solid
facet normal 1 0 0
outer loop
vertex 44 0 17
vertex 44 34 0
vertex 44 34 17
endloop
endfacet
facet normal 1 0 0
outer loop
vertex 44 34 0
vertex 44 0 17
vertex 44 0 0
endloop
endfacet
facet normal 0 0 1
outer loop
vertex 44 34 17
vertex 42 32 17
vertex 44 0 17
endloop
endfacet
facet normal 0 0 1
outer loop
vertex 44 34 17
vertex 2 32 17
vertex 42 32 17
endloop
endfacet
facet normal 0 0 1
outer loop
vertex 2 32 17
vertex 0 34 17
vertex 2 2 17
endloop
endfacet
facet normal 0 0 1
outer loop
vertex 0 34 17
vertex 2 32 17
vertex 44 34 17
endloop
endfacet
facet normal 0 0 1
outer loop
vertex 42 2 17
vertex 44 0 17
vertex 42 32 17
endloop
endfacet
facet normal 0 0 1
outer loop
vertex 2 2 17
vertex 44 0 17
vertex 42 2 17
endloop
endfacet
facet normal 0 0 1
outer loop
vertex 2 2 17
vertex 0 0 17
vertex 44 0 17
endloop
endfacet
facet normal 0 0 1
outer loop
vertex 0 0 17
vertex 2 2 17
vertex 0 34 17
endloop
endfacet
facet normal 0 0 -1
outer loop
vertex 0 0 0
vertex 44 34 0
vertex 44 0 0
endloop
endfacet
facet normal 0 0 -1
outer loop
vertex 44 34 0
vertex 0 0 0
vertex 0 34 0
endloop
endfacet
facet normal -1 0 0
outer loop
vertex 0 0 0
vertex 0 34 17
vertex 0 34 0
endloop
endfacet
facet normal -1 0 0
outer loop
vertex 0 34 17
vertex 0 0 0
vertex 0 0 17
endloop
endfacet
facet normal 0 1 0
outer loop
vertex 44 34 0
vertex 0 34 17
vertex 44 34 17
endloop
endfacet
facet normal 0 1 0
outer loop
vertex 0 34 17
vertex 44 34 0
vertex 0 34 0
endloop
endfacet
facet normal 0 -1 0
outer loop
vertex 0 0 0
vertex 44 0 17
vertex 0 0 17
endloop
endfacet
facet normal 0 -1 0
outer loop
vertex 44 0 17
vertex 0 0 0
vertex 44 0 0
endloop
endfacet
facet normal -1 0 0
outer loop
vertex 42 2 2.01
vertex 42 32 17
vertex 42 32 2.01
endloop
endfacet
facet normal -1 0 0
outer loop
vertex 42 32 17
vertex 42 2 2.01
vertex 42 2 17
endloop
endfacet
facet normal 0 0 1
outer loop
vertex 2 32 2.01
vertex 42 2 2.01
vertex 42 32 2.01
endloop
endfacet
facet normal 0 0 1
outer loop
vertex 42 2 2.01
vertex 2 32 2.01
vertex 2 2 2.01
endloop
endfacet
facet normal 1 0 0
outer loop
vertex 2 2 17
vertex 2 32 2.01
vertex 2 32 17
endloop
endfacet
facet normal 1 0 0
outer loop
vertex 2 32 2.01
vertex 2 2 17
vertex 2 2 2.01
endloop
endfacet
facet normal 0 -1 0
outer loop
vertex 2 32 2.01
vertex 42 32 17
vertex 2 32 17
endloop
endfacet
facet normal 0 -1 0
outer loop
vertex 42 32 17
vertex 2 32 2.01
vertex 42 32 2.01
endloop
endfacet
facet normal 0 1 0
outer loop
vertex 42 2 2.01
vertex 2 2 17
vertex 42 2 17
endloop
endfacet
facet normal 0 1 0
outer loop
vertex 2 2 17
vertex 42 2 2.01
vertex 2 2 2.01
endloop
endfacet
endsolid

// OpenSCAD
text_intrusion = 1;

/* [box dimensions] */
//inner box length
iB_width = 40;
//inner box depth
iB_depth  = 30;
//inner box height
iB_height = 15;
//wall thickness
wall_thickness = 2;

/* [lid dimensions] */
//the height of the lid
lid_height = 3;

/* [Left] */
//add a barrel jack to the left side (-x)
barrel_jack_left = false;
//add a cable hole to the left side (-x)
square_left = false;
//the size of the square
square_left_size = [10, 10];
//air holes
holes_left         = false;
holes_left_d       = 2;
holes_left_rows    = 5;
holes_left_columns = 5;
//the text which should be written on the left side
text_left = "";
//should the text be extruded in intruded
text_left_in_or_out = "in"; //[ex:extrude, in:intrude]
text_left_size = 10;
text_left_font = "";
text_left_spacing = 1; //[0:0.1:100]

/* [Right] */
//add a barrel jack to the right side (+x)
barrel_jack_right = false;
//add a cable hole to the right side (+x)
square_right = false;
//the size of the square
square_right_size = [10, 10];
//air holes
holes_right         = false;
holes_right_d       = 2;
holes_right_rows    = 5;
holes_right_columns = 5;
//the text which should be written on the right side
text_right = "";
text_right_size = 10;
text_right_font = "";
text_right_spacing = 1; //[0:0.1:100]

/* [Top] */
//add a barrel jack to the top side (-z)
barrel_jack_top = false;
//add a cable hole to the top side (-z)
square_top = false;
//the size of the square
square_top_size = [10, 10];
//air holes
holes_top         = false;
holes_top_d       = 2;
holes_top_rows    = 5;
holes_top_columns = 5;
//the text which should be written on the top side
text_top = "";
text_top_size = 10;
text_top_font = "";
text_top_spacing = 1; //[0:0.1:100]

/* [Bottom] */
//add a barrel jack to the bottom side (+z)
barrel_jack_bottom = false;
//add a cable hole to the bottom side (+z)
square_bottom = false;
//the size of the square
square_bottom_size = [10, 10];
//air holes
holes_bottom         = false;
holes_bottom_d       = 2;
holes_bottom_rows    = 5;
holes_bottom_columns = 5;
//the text which should be written on the bottom side
text_bottom = "";
text_bottom_size = 10;
text_bottom_font = "";
text_bottom_spacing = 1; //[0:0.1:100]

/* [Front] */
//add a barrel jack to the front side (+y)
barrel_jack_front = false;
//add a cable hole to the front side (+y)
square_front = false;
//the size of the square
square_front_size = [10, 10];
//air holes
holes_front         = false;
holes_front_d       = 2;
holes_front_rows    = 5;
holes_front_columns = 5;
//the text which should be written on the front side
text_front = "";
text_front_size = 10;
text_front_font = "";
text_front_spacing = 1; //[0:0.1:100]

/* [Back] */
//add a barrel jack to the back side (-y)
barrel_jack_back = false;
//add a cable hole to the back side (-y)
square_back = false;
//the size of the square
square_back_size = [10, 10];
//air holes
holes_back         = false;
holes_back_d       = 2;
holes_back_rows    = 5;
holes_back_columns = 5;
//the text which should be written on the back side
text_back = "";
text_back_size = 10;
text_back_font = "";
text_back_spacing = 1; //[0:0.1:100]



/* [Render Options] */
//show the lid
show_lid = false;
//show the box
show_box = true;
//resolution
$fn = 100;

/* [Hidden] */
//DIMENSIONS
//barrel_jack
barrel_jack_d = 8;

//margin for the overlaps so that the preview gets right
preview_margin = 0.01;


module box(){
    difference(){
        //outher shell
        cube([iB_width + 2*wall_thickness, iB_depth + 2*wall_thickness, iB_height + wall_thickness]);
        //remove inside
        translate([wall_thickness, wall_thickness, wall_thickness + preview_margin]){
            cube([iB_width, iB_depth, iB_height]);
        }

        //connections
        //add barrel jack-hole(s)
        if(barrel_jack_left){
            translate([wall_thickness/2, wall_thickness + iB_depth/2, wall_thickness + iB_height/2]){
                rotate([0, 90, 0]){
                    cylinder(d=barrel_jack_d, h=wall_thickness+4*preview_margin, center=true);
                }
            }
        }
        if(barrel_jack_right){
            translate([wall_thickness*3/2 + iB_width, wall_thickness + iB_depth/2, wall_thickness + iB_height/2]){
                rotate([0, 90, 0]){
                    cylinder(d=barrel_jack_d, h=wall_thickness+4*preview_margin, center=true);
                }
            }
        }
        if(barrel_jack_bottom){
            translate([wall_thickness + iB_width/2, wall_thickness + iB_depth/2, wall_thickness/2]){
                rotate([0, 0, 0]){
                    cylinder(d=barrel_jack_d, h=wall_thickness+4*preview_margin, center=true);
                }
            }
        }
        if(barrel_jack_back){
            translate([wall_thickness + iB_width/2, wall_thickness/2, wall_thickness + iB_height/2]){
                rotate([90, 0, 0]){
                    cylinder(d=barrel_jack_d, h=wall_thickness+4*preview_margin, center=true);
                }
            }
        }
        if(barrel_jack_front){
            translate([wall_thickness + iB_width/2, wall_thickness*3/2 + iB_depth, wall_thickness + iB_height/2]){
                rotate([90, 0, 0]){
                    cylinder(d=barrel_jack_d, h=wall_thickness+4*preview_margin, center=true);
                }
            }
        }
        //add cable holes 
        if(square_left){
            translate([wall_thickness/2, wall_thickness + iB_depth/2, wall_thickness + iB_height/2]){
                cube(concat(wall_thickness+4*preview_margin, square_left_size), center=true);
            }
        }
        if(square_right){
            translate([wall_thickness*3/2 + iB_width, wall_thickness + iB_depth/2, wall_thickness + iB_height/2]){
                cube(concat(wall_thickness+4*preview_margin, square_right_size), center=true);
            }
        }
        if(square_bottom){
            translate([wall_thickness + iB_width/2, wall_thickness + iB_depth/2, wall_thickness/2]){
                cube(concat(square_bottom_size, wall_thickness+4*preview_margin), center=true);
            }
        }
        if(square_back){
            translate([wall_thickness + iB_width/2, wall_thickness/2, wall_thickness + iB_height/2]){
                cube([square_back_size[0], wall_thickness+4*preview_margin, square_back_size[1]], center=true);
            }
        }
        if(square_front){
            translate([wall_thickness + iB_width/2, wall_thickness*3/2 + iB_depth, wall_thickness + iB_height/2]){
                cube([square_front_size[0], wall_thickness+4*preview_margin, square_front_size[1]], center=true);
            }
        }

        //add air holes
        if(holes_left){
            translate([holes_left_d, wall_thickness, wall_thickness]) {
                rotate([0, -90, 0]){
                    #circles(d=holes_left_d, h=wall_thickness,
                            row=holes_left_rows, column=holes_left_columns,
                            height=iB_depth, width=iB_height);
                }
            }
        }
        if(holes_right){
            translate([2*wall_thickness+iB_width, wall_thickness, wall_thickness]) {
                rotate([0, -90, 0]){
                    #circles(d=holes_left_d, h=wall_thickness,
                            row=holes_left_rows, column=holes_left_columns,
                            height=iB_depth, width=iB_height);
                }
            }
        }
        if(holes_bottom){
            translate([wall_thickness, wall_thickness, 0]) {
                rotate([0, 0, 0]){
                    #circles(d=holes_left_d, h=wall_thickness,
                            row=holes_left_rows, column=holes_left_columns,
                            height=iB_depth, width=iB_width);
                }
            }
        }
        if(holes_back){
            translate([wall_thickness, 0, wall_thickness]) {
                rotate([0, -90, -90]){
                    #circles(d=holes_left_d, h=wall_thickness,
                            row=holes_left_rows, column=holes_left_columns,
                            height=iB_width, width=iB_height);
                }
            }
        }
        if(holes_front){
            translate([wall_thickness, wall_thickness+iB_depth, wall_thickness]) {
                rotate([0, -90, -90]){
                    #circles(d=holes_left_d, h=wall_thickness,
                            row=holes_left_rows, column=holes_left_columns,
                            height=iB_width, width=iB_height);
                }
            }
        }

        //TEXT (intrusion)
        //left
        if(text_left != ""){
            translate([text_intrusion-preview_margin, wall_thickness+iB_depth/2, wall_thickness+iB_height/2]){
                rotate([90, 0, -90]){
                    linear_extrude(text_intrusion){
                        text(text=text_left, size=text_left_size, font=text_left_font, spacing=text_left_spacing,
                            halign="center", valign="center");
                    }
                }
            }
        }
        //right
        if(text_right != ""){
            translate([wall_thickness*2 + iB_width - text_intrusion, wall_thickness + iB_depth/2, wall_thickness + iB_height/2]){
                rotate([90, 0, 90]){
                    linear_extrude(text_intrusion){
                        text(text=text_right, size=text_right_size, font=text_right_font, spacing=text_right_spacing,
                            halign="center", valign="center");
                    }
                }
            }
        }
        //bottom
        if(text_bottom != ""){
            translate([wall_thickness + iB_width/2, wall_thickness + iB_depth/2, text_intrusion]){
                rotate([0, 180, 0]){
                    linear_extrude(text_intrusion){
                        text(text=text_bottom, size=text_bottom_size, font=text_bottom_font, spacing=text_bottom_spacing,
                            halign="center", valign="center");
                    }
                }
            }
        }
        //back
        if(text_back != ""){
            translate([wall_thickness + iB_width/2, 2*wall_thickness + iB_depth - text_intrusion, wall_thickness + iB_height/2]){
                rotate([90, 0, 180]){
                    linear_extrude(text_intrusion){
                        text(text=text_back, size=text_back_size, font=text_back_font, spacing=text_back_spacing,
                            halign="center", valign="center");
                    }
                }
            }
        }
        //front
        if(text_front != ""){
            translate([wall_thickness + iB_width/2, text_intrusion, wall_thickness + iB_height/2]){
                rotate([90, 0, 0]){
                    linear_extrude(text_intrusion){
                        text(text=text_front, size=text_front_size, font=text_front_font, spacing=text_front_spacing,
                            halign="center", valign="center");
                    }
                }
            }
        }
    }
}

module lid(){
    difference(){
        union(){
            //outher shell
            cube([iB_width + 2*wall_thickness, iB_depth + 2*wall_thickness, lid_height/2]);
            //add longer part
            translate([wall_thickness, wall_thickness, lid_height/2 + preview_margin]){
                cube([iB_width, iB_depth, lid_height/2]);
            }
        }

        //connections
        //barrel jack
        if(barrel_jack_top){
            translate([wall_thickness + iB_width/2, wall_thickness + iB_depth/2, lid_height/2]){
                rotate([0, 0, 0]){
                    cylinder(d=barrel_jack_d, h=lid_height+4*preview_margin, center=true);
                }
            }
        }
        //cables
        if(square_top){
            translate([wall_thickness + iB_width/2, wall_thickness + iB_depth/2, lid_height/2]){
                cube(concat(square_top_size, lid_height+4*preview_margin), center=true);
            }
        }
        //air holes
        if(holes_top){
            translate([wall_thickness, wall_thickness, 0]) {
                rotate([0, 0, 0]){
                    #circles(d=holes_left_d, h=lid_height,
                            row=holes_left_rows, column=holes_left_columns,
                            height=iB_depth, width=iB_width);
                }
            }
        }
        //text
        //top
        if(text_top != ""){
            translate([wall_thickness + iB_width/2, wall_thickness + iB_depth/2, text_intrusion]){
                rotate([0, 180, 0]){
                    linear_extrude(text_intrusion){
                        text(text=text_top, size=text_top_size, font=text_top_font, spacing=text_top_spacing,
                            halign="center", valign="center");
                    }
                }
            }
        }
    }
}

module circles(d=5, h=3, row=10, column=5, height=10, width=10){
    for (x=[d : width/row - 2*d/row : width]) {
        for (y=[d : height/column - 2*d/column : height]) {
            translate([x, y, 0]) {
                cylinder(d=d, h=h+preview_margin);
            }
        }
    }
}

module main(){
    if(show_lid){
        lid();
    }
    if(show_box){
        box();
    }
}

main();
